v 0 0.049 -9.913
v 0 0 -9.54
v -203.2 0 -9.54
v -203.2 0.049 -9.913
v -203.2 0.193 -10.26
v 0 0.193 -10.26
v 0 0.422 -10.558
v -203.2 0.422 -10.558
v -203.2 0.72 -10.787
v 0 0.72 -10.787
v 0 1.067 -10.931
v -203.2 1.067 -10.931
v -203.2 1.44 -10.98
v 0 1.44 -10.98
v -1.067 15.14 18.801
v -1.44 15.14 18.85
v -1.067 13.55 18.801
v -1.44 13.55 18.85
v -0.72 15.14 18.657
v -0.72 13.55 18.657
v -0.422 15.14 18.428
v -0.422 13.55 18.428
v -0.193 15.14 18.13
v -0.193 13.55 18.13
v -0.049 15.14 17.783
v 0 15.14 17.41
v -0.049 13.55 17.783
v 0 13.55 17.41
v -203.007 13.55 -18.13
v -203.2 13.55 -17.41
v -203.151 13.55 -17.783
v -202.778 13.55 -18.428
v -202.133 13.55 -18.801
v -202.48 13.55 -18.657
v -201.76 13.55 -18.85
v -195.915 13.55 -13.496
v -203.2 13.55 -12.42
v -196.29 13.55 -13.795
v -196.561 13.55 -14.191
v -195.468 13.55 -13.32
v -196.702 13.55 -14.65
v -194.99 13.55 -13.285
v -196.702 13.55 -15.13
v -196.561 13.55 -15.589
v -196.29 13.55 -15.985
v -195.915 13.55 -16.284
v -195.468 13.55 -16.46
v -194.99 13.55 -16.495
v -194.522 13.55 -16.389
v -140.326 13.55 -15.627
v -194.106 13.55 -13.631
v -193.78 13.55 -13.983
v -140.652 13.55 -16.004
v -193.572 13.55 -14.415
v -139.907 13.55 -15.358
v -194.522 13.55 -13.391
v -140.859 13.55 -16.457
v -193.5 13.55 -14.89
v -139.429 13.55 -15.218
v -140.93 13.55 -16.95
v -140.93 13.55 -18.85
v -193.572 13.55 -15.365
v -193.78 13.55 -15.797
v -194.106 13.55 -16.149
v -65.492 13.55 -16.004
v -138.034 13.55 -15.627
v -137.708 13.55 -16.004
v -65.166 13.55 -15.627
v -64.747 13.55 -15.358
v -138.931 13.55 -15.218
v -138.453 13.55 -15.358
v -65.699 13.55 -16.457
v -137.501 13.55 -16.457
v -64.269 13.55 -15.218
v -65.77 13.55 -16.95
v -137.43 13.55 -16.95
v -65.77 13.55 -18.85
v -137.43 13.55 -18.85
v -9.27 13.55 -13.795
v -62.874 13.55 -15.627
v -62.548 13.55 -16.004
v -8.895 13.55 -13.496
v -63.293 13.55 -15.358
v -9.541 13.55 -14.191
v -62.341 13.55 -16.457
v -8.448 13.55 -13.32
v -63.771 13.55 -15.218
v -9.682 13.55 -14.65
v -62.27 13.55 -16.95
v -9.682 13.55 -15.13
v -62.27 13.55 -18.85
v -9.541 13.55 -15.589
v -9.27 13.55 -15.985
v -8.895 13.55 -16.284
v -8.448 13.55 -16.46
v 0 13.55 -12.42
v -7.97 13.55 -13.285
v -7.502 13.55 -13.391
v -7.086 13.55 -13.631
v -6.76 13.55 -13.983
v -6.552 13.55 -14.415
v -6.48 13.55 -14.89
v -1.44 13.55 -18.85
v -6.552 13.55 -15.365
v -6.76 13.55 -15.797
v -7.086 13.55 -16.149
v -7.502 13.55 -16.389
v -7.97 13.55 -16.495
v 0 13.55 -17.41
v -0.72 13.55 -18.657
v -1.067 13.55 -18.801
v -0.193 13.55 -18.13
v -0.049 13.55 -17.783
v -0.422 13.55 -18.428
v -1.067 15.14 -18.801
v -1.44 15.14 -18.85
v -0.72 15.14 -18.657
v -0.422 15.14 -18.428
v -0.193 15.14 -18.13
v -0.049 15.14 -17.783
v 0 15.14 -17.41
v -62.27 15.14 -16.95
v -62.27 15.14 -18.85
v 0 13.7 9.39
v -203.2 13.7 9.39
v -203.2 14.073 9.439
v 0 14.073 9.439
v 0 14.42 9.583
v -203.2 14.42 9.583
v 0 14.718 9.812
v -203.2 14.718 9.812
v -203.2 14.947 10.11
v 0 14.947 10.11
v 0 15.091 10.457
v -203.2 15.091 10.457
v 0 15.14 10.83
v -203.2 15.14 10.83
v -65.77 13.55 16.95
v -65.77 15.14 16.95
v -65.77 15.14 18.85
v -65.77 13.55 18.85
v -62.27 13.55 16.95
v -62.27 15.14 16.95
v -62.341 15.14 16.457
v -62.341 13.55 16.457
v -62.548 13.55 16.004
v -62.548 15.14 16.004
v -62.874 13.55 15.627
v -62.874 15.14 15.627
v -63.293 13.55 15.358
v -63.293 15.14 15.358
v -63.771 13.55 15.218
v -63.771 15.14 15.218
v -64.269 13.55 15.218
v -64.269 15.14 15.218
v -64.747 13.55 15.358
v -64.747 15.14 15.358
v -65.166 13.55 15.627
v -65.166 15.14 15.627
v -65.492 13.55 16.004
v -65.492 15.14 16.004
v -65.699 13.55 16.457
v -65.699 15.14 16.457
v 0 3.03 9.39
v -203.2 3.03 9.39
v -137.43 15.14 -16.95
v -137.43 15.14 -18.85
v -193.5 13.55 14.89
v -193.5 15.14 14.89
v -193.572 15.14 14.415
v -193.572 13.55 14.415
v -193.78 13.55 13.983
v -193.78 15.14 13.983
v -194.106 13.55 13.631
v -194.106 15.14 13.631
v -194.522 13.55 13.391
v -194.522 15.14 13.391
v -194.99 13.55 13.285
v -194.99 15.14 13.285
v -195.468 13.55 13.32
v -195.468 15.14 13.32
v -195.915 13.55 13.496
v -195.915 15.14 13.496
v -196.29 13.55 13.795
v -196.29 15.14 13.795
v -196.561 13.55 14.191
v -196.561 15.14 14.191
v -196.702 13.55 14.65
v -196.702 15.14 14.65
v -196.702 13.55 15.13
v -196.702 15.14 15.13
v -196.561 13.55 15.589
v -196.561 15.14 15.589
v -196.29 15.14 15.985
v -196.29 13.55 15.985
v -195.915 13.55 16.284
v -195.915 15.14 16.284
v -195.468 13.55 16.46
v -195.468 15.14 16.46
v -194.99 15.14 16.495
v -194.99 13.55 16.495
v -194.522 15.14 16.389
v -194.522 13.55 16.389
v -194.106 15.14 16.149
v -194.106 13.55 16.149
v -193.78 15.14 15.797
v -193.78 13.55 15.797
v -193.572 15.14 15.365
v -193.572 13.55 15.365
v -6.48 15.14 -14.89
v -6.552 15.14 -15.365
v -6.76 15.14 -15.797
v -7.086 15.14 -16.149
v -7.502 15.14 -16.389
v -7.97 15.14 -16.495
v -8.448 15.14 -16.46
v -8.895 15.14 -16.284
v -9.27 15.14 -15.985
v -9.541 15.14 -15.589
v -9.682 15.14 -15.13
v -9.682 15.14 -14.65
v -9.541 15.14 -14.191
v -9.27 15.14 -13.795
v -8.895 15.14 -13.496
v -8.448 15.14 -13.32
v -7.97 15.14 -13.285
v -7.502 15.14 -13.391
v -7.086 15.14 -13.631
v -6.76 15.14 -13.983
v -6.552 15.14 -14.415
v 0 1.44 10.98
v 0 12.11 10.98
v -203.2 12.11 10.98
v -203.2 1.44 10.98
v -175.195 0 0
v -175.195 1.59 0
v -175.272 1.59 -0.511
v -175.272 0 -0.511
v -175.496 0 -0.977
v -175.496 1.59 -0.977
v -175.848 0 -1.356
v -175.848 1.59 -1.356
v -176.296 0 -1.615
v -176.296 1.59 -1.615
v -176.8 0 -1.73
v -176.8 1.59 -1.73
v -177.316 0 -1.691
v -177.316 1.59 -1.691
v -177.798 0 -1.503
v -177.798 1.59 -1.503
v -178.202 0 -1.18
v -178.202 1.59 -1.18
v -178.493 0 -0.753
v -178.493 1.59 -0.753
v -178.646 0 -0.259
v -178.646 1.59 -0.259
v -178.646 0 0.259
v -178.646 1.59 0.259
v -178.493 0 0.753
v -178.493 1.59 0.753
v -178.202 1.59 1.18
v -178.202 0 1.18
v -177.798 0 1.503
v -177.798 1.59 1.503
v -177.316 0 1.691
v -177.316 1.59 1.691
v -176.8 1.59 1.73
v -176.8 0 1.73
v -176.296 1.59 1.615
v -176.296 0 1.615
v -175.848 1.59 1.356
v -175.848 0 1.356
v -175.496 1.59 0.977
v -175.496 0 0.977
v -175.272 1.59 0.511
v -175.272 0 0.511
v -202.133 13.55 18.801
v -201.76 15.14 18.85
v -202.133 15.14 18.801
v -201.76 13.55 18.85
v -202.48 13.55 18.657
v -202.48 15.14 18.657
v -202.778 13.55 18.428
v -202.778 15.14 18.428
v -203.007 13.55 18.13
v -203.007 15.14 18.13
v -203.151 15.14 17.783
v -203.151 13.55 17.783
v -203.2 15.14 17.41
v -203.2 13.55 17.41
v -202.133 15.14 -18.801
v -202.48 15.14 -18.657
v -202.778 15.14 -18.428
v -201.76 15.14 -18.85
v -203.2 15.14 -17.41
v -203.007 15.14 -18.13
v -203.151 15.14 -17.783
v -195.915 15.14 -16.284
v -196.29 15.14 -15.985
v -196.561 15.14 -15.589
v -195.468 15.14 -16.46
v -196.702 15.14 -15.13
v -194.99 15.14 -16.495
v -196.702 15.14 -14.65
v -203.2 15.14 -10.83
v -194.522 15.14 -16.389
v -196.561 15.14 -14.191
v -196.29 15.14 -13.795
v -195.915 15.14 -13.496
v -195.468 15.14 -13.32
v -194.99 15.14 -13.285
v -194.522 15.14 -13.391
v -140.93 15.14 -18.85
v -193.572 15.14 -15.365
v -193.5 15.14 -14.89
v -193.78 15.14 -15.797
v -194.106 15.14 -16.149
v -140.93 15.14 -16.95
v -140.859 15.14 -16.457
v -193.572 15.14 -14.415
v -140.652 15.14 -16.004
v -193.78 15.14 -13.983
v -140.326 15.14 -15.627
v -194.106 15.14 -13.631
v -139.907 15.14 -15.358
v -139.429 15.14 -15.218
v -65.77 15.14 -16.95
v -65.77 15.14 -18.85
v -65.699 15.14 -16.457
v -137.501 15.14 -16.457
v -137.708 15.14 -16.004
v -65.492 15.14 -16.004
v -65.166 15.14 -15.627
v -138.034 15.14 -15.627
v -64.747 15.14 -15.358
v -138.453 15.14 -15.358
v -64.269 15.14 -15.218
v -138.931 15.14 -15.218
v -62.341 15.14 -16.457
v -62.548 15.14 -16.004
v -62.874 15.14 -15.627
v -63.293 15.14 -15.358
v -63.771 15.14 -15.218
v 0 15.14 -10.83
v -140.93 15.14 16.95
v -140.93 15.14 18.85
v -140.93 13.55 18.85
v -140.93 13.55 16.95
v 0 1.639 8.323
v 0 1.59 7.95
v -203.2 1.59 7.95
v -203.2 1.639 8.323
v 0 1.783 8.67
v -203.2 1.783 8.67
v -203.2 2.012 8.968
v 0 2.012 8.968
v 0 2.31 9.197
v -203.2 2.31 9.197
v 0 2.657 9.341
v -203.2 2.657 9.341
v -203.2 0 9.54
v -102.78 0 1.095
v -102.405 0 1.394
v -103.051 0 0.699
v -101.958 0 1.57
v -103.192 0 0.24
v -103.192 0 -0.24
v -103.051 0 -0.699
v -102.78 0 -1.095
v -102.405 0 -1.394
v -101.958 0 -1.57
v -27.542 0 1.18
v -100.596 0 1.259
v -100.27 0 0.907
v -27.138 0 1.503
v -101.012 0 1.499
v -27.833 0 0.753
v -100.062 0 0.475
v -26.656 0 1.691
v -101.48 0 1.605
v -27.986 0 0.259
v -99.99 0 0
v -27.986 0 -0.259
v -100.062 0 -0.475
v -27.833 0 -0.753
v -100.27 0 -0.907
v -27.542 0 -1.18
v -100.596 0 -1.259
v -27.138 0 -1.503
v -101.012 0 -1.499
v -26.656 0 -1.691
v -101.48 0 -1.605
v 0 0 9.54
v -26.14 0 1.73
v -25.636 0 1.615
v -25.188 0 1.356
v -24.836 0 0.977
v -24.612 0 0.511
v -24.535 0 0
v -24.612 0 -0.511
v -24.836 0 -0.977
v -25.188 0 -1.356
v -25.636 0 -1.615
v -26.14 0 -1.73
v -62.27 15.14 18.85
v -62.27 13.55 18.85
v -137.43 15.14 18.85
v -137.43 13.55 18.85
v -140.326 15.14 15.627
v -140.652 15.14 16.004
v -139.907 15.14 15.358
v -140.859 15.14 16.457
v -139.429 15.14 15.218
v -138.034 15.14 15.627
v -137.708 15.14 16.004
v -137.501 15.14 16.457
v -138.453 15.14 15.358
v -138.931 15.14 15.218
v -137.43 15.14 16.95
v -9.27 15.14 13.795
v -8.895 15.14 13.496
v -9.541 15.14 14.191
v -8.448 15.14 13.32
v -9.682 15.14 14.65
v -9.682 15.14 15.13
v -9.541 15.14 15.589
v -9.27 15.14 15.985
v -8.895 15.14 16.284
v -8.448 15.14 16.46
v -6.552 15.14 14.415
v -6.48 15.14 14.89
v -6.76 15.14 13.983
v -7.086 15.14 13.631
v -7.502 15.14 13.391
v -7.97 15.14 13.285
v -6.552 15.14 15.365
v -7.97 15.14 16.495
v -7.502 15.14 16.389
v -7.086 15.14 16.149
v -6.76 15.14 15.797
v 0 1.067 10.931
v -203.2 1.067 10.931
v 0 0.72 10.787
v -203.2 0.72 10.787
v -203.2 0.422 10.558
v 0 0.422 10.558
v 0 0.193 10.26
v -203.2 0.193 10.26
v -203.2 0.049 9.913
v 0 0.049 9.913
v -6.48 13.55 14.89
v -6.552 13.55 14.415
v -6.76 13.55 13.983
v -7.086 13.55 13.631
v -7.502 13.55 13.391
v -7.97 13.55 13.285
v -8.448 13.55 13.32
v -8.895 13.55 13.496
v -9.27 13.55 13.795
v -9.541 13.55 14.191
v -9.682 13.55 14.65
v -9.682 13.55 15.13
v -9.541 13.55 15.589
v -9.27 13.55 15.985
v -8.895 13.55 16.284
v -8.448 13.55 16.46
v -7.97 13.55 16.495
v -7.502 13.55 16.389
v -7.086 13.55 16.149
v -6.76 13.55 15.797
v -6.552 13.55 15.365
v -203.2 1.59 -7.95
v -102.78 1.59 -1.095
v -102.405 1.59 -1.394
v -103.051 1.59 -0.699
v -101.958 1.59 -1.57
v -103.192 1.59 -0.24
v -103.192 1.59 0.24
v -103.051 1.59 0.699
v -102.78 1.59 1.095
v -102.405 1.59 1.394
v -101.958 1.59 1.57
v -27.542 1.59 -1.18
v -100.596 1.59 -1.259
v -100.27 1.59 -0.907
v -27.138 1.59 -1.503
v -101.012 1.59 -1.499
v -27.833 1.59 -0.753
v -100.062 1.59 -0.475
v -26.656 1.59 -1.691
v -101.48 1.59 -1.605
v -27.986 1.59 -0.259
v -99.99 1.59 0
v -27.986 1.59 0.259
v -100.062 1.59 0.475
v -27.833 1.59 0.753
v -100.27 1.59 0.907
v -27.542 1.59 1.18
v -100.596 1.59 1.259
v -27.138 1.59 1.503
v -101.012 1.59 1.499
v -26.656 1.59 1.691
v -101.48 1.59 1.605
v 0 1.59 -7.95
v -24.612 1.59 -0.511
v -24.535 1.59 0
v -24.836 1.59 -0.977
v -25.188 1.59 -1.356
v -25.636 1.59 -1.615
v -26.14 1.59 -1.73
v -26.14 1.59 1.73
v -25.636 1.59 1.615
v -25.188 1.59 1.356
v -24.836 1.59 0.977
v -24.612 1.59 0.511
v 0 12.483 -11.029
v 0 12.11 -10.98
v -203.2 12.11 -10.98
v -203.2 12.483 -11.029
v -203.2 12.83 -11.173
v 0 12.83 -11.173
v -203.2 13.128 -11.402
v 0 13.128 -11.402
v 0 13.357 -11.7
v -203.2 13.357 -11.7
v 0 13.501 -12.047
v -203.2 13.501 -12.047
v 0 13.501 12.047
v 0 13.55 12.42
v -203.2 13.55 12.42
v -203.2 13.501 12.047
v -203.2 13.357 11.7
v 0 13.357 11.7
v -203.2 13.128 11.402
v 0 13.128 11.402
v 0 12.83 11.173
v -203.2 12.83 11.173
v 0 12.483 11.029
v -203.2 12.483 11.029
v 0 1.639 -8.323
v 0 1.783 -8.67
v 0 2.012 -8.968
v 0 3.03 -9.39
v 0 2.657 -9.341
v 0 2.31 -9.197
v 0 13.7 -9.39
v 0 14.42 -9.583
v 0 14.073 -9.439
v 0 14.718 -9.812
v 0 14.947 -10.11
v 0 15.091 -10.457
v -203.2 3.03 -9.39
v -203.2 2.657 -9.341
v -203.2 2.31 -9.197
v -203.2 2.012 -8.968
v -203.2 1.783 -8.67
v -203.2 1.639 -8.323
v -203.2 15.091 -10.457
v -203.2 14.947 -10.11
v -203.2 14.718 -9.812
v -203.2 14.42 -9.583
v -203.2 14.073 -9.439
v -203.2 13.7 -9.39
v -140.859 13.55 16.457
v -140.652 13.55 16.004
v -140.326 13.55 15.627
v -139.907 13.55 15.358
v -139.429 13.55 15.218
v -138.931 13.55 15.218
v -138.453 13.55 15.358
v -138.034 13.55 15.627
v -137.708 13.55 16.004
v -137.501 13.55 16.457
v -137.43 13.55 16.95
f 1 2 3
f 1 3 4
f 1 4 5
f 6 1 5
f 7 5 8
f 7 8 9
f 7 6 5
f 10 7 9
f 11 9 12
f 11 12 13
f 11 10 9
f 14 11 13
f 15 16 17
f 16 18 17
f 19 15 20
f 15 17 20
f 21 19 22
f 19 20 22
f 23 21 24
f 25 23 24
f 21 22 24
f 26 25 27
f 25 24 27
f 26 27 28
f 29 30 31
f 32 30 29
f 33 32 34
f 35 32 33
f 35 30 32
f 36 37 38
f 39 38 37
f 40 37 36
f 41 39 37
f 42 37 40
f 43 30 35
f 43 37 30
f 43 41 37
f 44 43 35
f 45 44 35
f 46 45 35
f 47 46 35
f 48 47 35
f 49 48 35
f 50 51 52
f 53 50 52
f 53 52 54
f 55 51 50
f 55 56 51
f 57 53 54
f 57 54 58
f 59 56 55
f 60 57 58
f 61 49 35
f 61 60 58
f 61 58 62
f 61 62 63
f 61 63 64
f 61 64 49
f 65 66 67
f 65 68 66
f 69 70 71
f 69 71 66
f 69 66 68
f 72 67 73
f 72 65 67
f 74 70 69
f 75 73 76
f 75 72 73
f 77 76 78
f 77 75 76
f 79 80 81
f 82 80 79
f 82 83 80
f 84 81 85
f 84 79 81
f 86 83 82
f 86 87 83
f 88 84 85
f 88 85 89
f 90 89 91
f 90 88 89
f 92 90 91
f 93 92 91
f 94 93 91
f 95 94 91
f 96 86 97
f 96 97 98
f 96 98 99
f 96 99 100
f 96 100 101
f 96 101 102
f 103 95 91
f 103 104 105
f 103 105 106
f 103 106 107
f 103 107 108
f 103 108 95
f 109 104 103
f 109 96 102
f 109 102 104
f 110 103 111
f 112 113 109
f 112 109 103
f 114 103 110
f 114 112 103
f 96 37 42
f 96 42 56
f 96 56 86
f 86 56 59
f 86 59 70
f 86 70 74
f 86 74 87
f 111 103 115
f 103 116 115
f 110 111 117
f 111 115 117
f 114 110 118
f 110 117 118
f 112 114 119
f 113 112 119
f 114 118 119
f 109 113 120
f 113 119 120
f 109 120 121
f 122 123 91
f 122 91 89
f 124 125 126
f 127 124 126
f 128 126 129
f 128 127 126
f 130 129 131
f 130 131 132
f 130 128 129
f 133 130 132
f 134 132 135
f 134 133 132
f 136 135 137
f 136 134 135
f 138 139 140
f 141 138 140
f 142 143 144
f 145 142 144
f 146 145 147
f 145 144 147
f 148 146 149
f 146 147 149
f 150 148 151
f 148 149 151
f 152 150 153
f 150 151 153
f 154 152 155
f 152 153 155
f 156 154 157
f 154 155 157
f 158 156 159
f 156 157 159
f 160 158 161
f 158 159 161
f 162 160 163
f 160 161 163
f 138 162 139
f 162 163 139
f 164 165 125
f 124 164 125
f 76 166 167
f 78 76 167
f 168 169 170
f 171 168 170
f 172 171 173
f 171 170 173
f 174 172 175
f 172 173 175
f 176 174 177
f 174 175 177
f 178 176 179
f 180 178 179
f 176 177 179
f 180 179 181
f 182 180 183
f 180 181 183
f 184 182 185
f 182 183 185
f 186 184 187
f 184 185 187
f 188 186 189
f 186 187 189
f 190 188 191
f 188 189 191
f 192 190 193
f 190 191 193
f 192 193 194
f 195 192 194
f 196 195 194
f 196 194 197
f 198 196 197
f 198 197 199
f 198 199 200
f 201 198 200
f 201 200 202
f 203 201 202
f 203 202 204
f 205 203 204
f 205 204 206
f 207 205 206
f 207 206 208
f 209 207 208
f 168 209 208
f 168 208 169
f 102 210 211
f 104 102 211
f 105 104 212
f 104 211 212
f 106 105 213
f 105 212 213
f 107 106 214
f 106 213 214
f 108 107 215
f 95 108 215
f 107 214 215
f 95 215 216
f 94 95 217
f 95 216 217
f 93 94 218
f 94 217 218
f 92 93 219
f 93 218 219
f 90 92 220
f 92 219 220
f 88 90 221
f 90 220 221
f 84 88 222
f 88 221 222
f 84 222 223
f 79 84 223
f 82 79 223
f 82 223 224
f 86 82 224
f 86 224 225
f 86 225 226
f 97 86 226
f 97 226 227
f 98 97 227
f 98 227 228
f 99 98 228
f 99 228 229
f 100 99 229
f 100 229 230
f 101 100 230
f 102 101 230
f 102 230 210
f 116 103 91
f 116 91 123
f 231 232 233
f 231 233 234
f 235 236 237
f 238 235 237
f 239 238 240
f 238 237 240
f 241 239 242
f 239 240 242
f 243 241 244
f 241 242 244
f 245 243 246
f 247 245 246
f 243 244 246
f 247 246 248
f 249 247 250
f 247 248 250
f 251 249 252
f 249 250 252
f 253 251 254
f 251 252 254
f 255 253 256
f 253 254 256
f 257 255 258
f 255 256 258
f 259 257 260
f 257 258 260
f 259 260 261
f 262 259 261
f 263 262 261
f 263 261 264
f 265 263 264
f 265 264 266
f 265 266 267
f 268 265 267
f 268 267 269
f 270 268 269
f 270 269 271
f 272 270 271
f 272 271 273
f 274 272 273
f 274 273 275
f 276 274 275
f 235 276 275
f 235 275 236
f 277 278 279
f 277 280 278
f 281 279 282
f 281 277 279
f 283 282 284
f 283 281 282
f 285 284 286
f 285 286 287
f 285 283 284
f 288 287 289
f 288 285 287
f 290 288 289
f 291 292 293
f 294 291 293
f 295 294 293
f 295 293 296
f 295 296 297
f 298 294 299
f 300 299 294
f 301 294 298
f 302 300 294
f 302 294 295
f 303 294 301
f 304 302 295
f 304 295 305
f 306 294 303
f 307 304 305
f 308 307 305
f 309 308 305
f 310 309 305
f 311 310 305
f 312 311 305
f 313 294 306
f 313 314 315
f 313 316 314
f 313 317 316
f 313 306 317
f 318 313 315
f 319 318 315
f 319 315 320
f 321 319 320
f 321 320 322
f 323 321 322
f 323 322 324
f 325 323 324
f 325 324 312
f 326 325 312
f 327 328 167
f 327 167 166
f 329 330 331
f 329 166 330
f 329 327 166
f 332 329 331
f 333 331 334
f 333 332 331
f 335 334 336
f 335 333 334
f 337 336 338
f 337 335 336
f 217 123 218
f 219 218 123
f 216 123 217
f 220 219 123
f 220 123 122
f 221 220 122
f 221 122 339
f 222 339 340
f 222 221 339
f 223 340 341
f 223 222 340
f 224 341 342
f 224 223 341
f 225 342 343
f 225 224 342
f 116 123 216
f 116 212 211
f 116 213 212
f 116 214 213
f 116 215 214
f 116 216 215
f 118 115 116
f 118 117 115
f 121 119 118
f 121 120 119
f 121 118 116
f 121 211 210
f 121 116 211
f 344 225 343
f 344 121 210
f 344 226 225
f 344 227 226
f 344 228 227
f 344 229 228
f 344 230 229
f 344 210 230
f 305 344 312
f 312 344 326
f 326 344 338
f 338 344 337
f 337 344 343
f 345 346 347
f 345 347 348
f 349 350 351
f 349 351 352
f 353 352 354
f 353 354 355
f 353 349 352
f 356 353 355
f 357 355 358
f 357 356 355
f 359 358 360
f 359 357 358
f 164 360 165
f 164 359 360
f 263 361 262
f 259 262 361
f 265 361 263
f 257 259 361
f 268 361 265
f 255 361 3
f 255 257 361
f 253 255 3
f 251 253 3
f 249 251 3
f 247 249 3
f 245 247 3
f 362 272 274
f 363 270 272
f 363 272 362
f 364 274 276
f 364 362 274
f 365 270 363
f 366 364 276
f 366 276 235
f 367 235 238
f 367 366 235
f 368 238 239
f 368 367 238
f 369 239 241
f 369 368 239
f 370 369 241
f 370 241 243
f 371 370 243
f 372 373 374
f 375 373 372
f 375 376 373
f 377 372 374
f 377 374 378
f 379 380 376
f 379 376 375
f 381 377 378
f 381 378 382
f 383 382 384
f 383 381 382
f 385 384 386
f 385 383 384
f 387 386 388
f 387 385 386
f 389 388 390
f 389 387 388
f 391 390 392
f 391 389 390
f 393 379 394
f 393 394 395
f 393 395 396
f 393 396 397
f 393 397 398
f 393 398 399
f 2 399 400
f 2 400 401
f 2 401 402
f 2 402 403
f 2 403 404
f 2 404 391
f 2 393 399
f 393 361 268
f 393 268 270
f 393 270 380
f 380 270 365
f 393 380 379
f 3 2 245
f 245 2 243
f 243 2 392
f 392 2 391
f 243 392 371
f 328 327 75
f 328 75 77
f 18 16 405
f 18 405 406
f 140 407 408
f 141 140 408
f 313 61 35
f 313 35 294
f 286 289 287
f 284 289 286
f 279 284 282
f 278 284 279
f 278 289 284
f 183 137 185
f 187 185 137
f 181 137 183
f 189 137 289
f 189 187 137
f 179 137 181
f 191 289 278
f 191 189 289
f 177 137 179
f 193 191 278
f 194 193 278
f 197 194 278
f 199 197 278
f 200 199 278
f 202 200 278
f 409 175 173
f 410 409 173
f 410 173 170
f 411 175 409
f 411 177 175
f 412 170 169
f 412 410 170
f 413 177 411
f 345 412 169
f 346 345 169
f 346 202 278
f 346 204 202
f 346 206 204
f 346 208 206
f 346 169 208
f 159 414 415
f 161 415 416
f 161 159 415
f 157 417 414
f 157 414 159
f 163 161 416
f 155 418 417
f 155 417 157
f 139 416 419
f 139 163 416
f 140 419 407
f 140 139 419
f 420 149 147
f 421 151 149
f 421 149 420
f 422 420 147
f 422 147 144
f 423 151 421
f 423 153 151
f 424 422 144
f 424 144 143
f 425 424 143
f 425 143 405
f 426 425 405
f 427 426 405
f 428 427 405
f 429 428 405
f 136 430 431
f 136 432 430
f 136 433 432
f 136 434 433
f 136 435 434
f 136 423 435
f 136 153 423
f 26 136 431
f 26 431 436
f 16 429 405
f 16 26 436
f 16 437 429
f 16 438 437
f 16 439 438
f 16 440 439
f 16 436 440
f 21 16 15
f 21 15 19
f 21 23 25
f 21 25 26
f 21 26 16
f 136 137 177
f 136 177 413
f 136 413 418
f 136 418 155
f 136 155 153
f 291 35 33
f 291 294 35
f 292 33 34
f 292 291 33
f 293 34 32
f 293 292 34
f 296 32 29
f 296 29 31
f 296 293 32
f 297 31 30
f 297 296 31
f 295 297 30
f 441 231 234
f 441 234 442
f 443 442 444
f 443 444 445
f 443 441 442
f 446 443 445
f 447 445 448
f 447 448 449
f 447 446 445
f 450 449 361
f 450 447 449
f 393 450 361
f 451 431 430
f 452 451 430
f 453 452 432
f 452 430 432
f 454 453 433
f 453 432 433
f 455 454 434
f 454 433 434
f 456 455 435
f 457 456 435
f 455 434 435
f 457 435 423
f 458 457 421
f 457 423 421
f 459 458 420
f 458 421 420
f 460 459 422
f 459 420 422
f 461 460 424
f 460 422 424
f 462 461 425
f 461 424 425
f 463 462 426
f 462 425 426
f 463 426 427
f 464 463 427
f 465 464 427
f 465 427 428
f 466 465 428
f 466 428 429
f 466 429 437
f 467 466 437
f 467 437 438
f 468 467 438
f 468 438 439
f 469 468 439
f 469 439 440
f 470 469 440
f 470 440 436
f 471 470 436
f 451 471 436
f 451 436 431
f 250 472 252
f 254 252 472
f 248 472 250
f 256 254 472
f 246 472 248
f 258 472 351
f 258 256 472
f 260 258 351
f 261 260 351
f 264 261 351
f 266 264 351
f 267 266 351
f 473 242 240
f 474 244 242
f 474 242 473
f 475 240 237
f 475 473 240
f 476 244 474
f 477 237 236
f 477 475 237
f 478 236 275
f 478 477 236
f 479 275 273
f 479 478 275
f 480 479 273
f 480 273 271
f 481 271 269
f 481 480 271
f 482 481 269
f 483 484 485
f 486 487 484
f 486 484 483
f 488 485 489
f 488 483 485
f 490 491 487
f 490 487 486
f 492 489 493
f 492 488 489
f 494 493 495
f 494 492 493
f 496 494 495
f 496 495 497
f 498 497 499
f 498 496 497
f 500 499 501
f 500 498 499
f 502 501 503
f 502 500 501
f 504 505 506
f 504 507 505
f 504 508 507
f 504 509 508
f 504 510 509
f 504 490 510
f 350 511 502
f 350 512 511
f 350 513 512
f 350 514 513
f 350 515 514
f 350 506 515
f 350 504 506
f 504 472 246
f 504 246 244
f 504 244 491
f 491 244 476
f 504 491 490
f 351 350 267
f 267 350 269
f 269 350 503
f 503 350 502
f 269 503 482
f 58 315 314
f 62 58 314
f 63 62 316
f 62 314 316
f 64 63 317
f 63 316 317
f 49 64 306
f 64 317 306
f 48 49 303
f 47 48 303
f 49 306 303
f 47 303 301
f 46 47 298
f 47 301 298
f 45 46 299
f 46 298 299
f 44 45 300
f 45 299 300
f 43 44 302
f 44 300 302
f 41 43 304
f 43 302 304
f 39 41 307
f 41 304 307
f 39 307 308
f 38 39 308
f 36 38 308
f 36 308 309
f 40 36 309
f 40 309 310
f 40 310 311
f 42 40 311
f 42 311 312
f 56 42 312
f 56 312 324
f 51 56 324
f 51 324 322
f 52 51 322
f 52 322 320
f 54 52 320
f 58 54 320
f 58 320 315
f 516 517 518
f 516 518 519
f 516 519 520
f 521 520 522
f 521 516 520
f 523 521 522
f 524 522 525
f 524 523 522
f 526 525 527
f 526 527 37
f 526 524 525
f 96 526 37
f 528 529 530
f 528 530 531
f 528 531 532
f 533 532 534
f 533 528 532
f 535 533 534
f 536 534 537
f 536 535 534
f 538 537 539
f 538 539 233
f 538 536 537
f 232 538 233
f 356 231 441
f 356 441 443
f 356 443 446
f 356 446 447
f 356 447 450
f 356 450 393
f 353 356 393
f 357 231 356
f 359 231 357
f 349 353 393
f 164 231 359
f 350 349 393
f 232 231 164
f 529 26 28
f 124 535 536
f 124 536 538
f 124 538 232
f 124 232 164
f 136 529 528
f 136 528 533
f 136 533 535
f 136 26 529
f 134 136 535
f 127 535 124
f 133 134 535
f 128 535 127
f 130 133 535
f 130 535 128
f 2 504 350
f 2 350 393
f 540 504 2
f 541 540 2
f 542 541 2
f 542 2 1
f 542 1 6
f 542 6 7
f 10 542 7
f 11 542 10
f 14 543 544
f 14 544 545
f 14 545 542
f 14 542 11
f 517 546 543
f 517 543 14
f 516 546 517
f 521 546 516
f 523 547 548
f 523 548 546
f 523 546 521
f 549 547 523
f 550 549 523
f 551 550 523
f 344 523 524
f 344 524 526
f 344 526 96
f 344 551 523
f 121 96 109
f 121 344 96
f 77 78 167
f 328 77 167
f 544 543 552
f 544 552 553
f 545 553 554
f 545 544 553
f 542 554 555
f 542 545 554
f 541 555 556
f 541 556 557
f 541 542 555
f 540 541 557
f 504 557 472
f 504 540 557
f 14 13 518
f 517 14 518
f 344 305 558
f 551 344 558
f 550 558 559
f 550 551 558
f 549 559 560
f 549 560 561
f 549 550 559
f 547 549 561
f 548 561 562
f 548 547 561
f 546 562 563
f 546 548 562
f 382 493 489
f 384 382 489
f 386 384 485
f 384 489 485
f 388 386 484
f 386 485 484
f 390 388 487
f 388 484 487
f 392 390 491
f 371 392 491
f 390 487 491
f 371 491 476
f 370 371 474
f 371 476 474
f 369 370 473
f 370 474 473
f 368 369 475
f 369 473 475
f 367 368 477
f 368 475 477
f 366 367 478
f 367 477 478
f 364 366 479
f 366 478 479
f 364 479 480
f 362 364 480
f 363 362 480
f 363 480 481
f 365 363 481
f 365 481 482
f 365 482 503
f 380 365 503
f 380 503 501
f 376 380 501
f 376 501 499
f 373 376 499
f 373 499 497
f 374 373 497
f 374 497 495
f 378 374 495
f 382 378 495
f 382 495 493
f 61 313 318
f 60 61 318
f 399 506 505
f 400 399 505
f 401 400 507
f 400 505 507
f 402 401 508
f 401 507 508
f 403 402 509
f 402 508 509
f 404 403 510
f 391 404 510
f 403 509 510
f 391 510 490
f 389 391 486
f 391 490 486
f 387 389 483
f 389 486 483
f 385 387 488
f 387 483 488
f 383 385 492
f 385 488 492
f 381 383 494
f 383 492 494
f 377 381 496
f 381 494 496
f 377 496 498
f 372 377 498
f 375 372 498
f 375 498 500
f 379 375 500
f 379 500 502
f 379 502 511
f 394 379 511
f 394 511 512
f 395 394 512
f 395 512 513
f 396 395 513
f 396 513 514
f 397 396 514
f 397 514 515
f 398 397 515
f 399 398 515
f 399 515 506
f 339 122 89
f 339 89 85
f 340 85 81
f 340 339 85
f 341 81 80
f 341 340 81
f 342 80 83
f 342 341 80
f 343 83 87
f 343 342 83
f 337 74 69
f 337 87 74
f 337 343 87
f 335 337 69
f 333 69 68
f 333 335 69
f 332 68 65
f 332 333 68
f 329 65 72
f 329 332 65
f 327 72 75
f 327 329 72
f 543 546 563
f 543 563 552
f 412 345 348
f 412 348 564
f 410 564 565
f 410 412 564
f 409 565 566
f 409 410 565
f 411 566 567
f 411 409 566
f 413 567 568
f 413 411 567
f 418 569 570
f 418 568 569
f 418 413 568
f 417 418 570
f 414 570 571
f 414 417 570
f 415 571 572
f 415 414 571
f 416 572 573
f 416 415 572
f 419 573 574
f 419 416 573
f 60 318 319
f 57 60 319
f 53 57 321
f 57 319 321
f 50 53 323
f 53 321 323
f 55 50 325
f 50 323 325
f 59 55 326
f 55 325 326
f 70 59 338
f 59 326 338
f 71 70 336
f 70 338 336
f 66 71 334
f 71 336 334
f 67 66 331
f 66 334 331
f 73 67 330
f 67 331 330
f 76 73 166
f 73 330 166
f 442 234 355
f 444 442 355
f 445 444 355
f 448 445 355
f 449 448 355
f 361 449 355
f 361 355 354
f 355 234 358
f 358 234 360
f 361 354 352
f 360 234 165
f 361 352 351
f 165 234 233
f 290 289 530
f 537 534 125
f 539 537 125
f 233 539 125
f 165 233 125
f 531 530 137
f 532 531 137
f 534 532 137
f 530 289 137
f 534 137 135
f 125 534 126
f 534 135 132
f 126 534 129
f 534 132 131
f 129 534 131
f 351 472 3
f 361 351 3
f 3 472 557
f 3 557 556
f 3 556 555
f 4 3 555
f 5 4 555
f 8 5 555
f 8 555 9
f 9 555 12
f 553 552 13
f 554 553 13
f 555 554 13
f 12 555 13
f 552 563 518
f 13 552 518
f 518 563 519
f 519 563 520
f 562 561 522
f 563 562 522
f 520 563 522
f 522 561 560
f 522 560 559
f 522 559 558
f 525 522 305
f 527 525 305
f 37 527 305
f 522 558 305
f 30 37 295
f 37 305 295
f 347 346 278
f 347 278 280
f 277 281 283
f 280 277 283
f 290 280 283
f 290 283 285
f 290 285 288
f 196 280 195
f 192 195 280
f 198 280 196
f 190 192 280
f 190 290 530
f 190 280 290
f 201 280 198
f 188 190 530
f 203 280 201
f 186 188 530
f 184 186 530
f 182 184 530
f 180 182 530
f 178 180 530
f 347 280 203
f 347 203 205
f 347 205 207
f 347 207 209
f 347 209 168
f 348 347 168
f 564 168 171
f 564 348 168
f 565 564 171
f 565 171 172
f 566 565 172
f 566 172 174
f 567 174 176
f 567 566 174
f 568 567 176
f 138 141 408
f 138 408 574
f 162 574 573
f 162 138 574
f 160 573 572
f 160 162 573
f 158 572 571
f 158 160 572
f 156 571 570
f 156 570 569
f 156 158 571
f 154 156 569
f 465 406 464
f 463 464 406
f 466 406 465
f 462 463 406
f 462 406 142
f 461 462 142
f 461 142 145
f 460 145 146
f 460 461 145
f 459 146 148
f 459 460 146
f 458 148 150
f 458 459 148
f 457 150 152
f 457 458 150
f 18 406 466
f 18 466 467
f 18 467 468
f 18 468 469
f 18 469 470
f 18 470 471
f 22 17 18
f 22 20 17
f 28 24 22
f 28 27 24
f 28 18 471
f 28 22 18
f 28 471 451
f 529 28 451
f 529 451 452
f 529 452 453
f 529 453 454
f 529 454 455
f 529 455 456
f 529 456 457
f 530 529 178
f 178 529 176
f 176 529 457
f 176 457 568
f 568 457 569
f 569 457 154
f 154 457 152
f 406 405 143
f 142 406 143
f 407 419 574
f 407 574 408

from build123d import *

# Parameters (mm, degrees)
BOSS_EXTRUDE2_DEPTH     = 203.2
FILLET4_R               = 1.44
SKETCH3_R               = 1.61
SKETCH3_R_2             = 1.735
CUT_EXTRUDE2_DEPTH      = 1
CUT_EXTRUDE2_DEPTH_BACK = 16.14


with BuildPart() as part:
    # Sketch1 → Boss-Extrude2 (new body)
    with BuildSketch(Plane(origin=(0, 0, 0), x_dir=(0, 0, -1), z_dir=(1, 0, 0))):
        with BuildLine():
            Line((-10.98, 12.11), (-10.98, 1.44))
            ThreePointArc((-10.98, 1.44), (-10.558233765, 0.421766235), (-9.54, 0))
            Line((-9.54, 0), (9.54, 0))
            ThreePointArc((9.54, 0), (10.558233765, 0.421766235), (10.98, 1.44))
            Line((10.98, 1.44), (10.98, 12.11))
            ThreePointArc((10.98, 12.11), (11.401766235, 13.128233765), (12.42, 13.55))
            Line((12.42, 13.55), (18.85, 13.55))
            Line((18.85, 13.55), (18.85, 15.14))
            Line((18.85, 15.14), (10.83, 15.14))
            ThreePointArc((10.83, 15.14), (9.811766235, 14.718233765), (9.39, 13.7))
            Line((9.39, 13.7), (9.39, 3.03))
            ThreePointArc((9.39, 3.03), (8.968233765, 2.011766235), (7.95, 1.59))
            Line((7.95, 1.59), (-7.95, 1.59))
            ThreePointArc((-7.95, 1.59), (-8.968233765, 2.011766235), (-9.39, 3.03))
            Line((-9.39, 3.03), (-9.39, 13.7))
            ThreePointArc((-9.39, 13.7), (-9.811766235, 14.718233765), (-10.83, 15.14))
            Line((-10.83, 15.14), (-18.85, 15.14))
            Line((-18.85, 15.14), (-18.85, 13.55))
            Line((-18.85, 13.55), (-12.42, 13.55))
            ThreePointArc((-12.42, 13.55), (-11.401766235, 13.128233765), (-10.98, 12.11))
        make_face()
    extrude(amount=-BOSS_EXTRUDE2_DEPTH)

    # Fillet4
    fillet4_edges = [part.edges().sort_by_distance(p)[0] for p in [
        (0, 14.345, 18.85),
        (0, 14.345, -18.85),
        (-203.2, 14.345, 18.85),
        (-203.2, 14.345, -18.85),
    ]]
    fillet(fillet4_edges, radius=FILLET4_R)

    # Sketch3 → Cut-Extrude2 (cut, two sides)
    with BuildSketch(Plane(origin=(0, 15.14, 0), x_dir=(1, 0, 0), z_dir=(0, 1, 0))) as cut_extrude2_sk:
        with Locations((-101.6, 0)):
            Circle(SKETCH3_R)
        with Locations((-26.27, 0)):
            Circle(SKETCH3_R_2)
        with Locations((-176.93, 0)):
            Circle(SKETCH3_R_2)
        with Locations((-195.11, 14.89)):
            Circle(SKETCH3_R)
        with Locations((-195.11, -14.89)):
            Circle(SKETCH3_R)
        with Locations((-8.09, 14.89)):
            Circle(SKETCH3_R)
        with Locations((-8.09, -14.89)):
            Circle(SKETCH3_R)
        with BuildLine():
            Line((-137.43, -16.95), (-137.43, -18.85))
            Line((-137.43, -18.85), (-140.93, -18.85))
            Line((-140.93, -18.85), (-140.93, -16.95))
            ThreePointArc((-140.93, -16.95), (-139.18, -15.2), (-137.43, -16.95))
        make_face()
        with BuildLine():
            Line((-140.93, 18.85), (-140.93, 16.95))
            ThreePointArc((-140.93, 16.95), (-139.18, 15.2), (-137.43, 16.95))
            Line((-137.43, 16.95), (-137.43, 18.85))
            Line((-137.43, 18.85), (-140.93, 18.85))
        make_face()
        with BuildLine():
            Line((-65.77, -16.95), (-65.77, -18.85))
            Line((-65.77, -18.85), (-62.27, -18.85))
            Line((-62.27, -18.85), (-62.27, -16.95))
            ThreePointArc((-62.27, -16.95), (-64.02, -15.2), (-65.77, -16.95))
        make_face()
        with BuildLine():
            Line((-65.77, 16.95), (-65.77, 18.85))
            Line((-65.77, 18.85), (-62.27, 18.85))
            Line((-62.27, 18.85), (-62.27, 16.95))
            ThreePointArc((-62.27, 16.95), (-64.02, 15.2), (-65.77, 16.95))
        make_face()
    extrude(amount=CUT_EXTRUDE2_DEPTH, mode=Mode.SUBTRACT)
    extrude(cut_extrude2_sk.sketch, amount=-CUT_EXTRUDE2_DEPTH_BACK, mode=Mode.SUBTRACT)


solid = part.part
